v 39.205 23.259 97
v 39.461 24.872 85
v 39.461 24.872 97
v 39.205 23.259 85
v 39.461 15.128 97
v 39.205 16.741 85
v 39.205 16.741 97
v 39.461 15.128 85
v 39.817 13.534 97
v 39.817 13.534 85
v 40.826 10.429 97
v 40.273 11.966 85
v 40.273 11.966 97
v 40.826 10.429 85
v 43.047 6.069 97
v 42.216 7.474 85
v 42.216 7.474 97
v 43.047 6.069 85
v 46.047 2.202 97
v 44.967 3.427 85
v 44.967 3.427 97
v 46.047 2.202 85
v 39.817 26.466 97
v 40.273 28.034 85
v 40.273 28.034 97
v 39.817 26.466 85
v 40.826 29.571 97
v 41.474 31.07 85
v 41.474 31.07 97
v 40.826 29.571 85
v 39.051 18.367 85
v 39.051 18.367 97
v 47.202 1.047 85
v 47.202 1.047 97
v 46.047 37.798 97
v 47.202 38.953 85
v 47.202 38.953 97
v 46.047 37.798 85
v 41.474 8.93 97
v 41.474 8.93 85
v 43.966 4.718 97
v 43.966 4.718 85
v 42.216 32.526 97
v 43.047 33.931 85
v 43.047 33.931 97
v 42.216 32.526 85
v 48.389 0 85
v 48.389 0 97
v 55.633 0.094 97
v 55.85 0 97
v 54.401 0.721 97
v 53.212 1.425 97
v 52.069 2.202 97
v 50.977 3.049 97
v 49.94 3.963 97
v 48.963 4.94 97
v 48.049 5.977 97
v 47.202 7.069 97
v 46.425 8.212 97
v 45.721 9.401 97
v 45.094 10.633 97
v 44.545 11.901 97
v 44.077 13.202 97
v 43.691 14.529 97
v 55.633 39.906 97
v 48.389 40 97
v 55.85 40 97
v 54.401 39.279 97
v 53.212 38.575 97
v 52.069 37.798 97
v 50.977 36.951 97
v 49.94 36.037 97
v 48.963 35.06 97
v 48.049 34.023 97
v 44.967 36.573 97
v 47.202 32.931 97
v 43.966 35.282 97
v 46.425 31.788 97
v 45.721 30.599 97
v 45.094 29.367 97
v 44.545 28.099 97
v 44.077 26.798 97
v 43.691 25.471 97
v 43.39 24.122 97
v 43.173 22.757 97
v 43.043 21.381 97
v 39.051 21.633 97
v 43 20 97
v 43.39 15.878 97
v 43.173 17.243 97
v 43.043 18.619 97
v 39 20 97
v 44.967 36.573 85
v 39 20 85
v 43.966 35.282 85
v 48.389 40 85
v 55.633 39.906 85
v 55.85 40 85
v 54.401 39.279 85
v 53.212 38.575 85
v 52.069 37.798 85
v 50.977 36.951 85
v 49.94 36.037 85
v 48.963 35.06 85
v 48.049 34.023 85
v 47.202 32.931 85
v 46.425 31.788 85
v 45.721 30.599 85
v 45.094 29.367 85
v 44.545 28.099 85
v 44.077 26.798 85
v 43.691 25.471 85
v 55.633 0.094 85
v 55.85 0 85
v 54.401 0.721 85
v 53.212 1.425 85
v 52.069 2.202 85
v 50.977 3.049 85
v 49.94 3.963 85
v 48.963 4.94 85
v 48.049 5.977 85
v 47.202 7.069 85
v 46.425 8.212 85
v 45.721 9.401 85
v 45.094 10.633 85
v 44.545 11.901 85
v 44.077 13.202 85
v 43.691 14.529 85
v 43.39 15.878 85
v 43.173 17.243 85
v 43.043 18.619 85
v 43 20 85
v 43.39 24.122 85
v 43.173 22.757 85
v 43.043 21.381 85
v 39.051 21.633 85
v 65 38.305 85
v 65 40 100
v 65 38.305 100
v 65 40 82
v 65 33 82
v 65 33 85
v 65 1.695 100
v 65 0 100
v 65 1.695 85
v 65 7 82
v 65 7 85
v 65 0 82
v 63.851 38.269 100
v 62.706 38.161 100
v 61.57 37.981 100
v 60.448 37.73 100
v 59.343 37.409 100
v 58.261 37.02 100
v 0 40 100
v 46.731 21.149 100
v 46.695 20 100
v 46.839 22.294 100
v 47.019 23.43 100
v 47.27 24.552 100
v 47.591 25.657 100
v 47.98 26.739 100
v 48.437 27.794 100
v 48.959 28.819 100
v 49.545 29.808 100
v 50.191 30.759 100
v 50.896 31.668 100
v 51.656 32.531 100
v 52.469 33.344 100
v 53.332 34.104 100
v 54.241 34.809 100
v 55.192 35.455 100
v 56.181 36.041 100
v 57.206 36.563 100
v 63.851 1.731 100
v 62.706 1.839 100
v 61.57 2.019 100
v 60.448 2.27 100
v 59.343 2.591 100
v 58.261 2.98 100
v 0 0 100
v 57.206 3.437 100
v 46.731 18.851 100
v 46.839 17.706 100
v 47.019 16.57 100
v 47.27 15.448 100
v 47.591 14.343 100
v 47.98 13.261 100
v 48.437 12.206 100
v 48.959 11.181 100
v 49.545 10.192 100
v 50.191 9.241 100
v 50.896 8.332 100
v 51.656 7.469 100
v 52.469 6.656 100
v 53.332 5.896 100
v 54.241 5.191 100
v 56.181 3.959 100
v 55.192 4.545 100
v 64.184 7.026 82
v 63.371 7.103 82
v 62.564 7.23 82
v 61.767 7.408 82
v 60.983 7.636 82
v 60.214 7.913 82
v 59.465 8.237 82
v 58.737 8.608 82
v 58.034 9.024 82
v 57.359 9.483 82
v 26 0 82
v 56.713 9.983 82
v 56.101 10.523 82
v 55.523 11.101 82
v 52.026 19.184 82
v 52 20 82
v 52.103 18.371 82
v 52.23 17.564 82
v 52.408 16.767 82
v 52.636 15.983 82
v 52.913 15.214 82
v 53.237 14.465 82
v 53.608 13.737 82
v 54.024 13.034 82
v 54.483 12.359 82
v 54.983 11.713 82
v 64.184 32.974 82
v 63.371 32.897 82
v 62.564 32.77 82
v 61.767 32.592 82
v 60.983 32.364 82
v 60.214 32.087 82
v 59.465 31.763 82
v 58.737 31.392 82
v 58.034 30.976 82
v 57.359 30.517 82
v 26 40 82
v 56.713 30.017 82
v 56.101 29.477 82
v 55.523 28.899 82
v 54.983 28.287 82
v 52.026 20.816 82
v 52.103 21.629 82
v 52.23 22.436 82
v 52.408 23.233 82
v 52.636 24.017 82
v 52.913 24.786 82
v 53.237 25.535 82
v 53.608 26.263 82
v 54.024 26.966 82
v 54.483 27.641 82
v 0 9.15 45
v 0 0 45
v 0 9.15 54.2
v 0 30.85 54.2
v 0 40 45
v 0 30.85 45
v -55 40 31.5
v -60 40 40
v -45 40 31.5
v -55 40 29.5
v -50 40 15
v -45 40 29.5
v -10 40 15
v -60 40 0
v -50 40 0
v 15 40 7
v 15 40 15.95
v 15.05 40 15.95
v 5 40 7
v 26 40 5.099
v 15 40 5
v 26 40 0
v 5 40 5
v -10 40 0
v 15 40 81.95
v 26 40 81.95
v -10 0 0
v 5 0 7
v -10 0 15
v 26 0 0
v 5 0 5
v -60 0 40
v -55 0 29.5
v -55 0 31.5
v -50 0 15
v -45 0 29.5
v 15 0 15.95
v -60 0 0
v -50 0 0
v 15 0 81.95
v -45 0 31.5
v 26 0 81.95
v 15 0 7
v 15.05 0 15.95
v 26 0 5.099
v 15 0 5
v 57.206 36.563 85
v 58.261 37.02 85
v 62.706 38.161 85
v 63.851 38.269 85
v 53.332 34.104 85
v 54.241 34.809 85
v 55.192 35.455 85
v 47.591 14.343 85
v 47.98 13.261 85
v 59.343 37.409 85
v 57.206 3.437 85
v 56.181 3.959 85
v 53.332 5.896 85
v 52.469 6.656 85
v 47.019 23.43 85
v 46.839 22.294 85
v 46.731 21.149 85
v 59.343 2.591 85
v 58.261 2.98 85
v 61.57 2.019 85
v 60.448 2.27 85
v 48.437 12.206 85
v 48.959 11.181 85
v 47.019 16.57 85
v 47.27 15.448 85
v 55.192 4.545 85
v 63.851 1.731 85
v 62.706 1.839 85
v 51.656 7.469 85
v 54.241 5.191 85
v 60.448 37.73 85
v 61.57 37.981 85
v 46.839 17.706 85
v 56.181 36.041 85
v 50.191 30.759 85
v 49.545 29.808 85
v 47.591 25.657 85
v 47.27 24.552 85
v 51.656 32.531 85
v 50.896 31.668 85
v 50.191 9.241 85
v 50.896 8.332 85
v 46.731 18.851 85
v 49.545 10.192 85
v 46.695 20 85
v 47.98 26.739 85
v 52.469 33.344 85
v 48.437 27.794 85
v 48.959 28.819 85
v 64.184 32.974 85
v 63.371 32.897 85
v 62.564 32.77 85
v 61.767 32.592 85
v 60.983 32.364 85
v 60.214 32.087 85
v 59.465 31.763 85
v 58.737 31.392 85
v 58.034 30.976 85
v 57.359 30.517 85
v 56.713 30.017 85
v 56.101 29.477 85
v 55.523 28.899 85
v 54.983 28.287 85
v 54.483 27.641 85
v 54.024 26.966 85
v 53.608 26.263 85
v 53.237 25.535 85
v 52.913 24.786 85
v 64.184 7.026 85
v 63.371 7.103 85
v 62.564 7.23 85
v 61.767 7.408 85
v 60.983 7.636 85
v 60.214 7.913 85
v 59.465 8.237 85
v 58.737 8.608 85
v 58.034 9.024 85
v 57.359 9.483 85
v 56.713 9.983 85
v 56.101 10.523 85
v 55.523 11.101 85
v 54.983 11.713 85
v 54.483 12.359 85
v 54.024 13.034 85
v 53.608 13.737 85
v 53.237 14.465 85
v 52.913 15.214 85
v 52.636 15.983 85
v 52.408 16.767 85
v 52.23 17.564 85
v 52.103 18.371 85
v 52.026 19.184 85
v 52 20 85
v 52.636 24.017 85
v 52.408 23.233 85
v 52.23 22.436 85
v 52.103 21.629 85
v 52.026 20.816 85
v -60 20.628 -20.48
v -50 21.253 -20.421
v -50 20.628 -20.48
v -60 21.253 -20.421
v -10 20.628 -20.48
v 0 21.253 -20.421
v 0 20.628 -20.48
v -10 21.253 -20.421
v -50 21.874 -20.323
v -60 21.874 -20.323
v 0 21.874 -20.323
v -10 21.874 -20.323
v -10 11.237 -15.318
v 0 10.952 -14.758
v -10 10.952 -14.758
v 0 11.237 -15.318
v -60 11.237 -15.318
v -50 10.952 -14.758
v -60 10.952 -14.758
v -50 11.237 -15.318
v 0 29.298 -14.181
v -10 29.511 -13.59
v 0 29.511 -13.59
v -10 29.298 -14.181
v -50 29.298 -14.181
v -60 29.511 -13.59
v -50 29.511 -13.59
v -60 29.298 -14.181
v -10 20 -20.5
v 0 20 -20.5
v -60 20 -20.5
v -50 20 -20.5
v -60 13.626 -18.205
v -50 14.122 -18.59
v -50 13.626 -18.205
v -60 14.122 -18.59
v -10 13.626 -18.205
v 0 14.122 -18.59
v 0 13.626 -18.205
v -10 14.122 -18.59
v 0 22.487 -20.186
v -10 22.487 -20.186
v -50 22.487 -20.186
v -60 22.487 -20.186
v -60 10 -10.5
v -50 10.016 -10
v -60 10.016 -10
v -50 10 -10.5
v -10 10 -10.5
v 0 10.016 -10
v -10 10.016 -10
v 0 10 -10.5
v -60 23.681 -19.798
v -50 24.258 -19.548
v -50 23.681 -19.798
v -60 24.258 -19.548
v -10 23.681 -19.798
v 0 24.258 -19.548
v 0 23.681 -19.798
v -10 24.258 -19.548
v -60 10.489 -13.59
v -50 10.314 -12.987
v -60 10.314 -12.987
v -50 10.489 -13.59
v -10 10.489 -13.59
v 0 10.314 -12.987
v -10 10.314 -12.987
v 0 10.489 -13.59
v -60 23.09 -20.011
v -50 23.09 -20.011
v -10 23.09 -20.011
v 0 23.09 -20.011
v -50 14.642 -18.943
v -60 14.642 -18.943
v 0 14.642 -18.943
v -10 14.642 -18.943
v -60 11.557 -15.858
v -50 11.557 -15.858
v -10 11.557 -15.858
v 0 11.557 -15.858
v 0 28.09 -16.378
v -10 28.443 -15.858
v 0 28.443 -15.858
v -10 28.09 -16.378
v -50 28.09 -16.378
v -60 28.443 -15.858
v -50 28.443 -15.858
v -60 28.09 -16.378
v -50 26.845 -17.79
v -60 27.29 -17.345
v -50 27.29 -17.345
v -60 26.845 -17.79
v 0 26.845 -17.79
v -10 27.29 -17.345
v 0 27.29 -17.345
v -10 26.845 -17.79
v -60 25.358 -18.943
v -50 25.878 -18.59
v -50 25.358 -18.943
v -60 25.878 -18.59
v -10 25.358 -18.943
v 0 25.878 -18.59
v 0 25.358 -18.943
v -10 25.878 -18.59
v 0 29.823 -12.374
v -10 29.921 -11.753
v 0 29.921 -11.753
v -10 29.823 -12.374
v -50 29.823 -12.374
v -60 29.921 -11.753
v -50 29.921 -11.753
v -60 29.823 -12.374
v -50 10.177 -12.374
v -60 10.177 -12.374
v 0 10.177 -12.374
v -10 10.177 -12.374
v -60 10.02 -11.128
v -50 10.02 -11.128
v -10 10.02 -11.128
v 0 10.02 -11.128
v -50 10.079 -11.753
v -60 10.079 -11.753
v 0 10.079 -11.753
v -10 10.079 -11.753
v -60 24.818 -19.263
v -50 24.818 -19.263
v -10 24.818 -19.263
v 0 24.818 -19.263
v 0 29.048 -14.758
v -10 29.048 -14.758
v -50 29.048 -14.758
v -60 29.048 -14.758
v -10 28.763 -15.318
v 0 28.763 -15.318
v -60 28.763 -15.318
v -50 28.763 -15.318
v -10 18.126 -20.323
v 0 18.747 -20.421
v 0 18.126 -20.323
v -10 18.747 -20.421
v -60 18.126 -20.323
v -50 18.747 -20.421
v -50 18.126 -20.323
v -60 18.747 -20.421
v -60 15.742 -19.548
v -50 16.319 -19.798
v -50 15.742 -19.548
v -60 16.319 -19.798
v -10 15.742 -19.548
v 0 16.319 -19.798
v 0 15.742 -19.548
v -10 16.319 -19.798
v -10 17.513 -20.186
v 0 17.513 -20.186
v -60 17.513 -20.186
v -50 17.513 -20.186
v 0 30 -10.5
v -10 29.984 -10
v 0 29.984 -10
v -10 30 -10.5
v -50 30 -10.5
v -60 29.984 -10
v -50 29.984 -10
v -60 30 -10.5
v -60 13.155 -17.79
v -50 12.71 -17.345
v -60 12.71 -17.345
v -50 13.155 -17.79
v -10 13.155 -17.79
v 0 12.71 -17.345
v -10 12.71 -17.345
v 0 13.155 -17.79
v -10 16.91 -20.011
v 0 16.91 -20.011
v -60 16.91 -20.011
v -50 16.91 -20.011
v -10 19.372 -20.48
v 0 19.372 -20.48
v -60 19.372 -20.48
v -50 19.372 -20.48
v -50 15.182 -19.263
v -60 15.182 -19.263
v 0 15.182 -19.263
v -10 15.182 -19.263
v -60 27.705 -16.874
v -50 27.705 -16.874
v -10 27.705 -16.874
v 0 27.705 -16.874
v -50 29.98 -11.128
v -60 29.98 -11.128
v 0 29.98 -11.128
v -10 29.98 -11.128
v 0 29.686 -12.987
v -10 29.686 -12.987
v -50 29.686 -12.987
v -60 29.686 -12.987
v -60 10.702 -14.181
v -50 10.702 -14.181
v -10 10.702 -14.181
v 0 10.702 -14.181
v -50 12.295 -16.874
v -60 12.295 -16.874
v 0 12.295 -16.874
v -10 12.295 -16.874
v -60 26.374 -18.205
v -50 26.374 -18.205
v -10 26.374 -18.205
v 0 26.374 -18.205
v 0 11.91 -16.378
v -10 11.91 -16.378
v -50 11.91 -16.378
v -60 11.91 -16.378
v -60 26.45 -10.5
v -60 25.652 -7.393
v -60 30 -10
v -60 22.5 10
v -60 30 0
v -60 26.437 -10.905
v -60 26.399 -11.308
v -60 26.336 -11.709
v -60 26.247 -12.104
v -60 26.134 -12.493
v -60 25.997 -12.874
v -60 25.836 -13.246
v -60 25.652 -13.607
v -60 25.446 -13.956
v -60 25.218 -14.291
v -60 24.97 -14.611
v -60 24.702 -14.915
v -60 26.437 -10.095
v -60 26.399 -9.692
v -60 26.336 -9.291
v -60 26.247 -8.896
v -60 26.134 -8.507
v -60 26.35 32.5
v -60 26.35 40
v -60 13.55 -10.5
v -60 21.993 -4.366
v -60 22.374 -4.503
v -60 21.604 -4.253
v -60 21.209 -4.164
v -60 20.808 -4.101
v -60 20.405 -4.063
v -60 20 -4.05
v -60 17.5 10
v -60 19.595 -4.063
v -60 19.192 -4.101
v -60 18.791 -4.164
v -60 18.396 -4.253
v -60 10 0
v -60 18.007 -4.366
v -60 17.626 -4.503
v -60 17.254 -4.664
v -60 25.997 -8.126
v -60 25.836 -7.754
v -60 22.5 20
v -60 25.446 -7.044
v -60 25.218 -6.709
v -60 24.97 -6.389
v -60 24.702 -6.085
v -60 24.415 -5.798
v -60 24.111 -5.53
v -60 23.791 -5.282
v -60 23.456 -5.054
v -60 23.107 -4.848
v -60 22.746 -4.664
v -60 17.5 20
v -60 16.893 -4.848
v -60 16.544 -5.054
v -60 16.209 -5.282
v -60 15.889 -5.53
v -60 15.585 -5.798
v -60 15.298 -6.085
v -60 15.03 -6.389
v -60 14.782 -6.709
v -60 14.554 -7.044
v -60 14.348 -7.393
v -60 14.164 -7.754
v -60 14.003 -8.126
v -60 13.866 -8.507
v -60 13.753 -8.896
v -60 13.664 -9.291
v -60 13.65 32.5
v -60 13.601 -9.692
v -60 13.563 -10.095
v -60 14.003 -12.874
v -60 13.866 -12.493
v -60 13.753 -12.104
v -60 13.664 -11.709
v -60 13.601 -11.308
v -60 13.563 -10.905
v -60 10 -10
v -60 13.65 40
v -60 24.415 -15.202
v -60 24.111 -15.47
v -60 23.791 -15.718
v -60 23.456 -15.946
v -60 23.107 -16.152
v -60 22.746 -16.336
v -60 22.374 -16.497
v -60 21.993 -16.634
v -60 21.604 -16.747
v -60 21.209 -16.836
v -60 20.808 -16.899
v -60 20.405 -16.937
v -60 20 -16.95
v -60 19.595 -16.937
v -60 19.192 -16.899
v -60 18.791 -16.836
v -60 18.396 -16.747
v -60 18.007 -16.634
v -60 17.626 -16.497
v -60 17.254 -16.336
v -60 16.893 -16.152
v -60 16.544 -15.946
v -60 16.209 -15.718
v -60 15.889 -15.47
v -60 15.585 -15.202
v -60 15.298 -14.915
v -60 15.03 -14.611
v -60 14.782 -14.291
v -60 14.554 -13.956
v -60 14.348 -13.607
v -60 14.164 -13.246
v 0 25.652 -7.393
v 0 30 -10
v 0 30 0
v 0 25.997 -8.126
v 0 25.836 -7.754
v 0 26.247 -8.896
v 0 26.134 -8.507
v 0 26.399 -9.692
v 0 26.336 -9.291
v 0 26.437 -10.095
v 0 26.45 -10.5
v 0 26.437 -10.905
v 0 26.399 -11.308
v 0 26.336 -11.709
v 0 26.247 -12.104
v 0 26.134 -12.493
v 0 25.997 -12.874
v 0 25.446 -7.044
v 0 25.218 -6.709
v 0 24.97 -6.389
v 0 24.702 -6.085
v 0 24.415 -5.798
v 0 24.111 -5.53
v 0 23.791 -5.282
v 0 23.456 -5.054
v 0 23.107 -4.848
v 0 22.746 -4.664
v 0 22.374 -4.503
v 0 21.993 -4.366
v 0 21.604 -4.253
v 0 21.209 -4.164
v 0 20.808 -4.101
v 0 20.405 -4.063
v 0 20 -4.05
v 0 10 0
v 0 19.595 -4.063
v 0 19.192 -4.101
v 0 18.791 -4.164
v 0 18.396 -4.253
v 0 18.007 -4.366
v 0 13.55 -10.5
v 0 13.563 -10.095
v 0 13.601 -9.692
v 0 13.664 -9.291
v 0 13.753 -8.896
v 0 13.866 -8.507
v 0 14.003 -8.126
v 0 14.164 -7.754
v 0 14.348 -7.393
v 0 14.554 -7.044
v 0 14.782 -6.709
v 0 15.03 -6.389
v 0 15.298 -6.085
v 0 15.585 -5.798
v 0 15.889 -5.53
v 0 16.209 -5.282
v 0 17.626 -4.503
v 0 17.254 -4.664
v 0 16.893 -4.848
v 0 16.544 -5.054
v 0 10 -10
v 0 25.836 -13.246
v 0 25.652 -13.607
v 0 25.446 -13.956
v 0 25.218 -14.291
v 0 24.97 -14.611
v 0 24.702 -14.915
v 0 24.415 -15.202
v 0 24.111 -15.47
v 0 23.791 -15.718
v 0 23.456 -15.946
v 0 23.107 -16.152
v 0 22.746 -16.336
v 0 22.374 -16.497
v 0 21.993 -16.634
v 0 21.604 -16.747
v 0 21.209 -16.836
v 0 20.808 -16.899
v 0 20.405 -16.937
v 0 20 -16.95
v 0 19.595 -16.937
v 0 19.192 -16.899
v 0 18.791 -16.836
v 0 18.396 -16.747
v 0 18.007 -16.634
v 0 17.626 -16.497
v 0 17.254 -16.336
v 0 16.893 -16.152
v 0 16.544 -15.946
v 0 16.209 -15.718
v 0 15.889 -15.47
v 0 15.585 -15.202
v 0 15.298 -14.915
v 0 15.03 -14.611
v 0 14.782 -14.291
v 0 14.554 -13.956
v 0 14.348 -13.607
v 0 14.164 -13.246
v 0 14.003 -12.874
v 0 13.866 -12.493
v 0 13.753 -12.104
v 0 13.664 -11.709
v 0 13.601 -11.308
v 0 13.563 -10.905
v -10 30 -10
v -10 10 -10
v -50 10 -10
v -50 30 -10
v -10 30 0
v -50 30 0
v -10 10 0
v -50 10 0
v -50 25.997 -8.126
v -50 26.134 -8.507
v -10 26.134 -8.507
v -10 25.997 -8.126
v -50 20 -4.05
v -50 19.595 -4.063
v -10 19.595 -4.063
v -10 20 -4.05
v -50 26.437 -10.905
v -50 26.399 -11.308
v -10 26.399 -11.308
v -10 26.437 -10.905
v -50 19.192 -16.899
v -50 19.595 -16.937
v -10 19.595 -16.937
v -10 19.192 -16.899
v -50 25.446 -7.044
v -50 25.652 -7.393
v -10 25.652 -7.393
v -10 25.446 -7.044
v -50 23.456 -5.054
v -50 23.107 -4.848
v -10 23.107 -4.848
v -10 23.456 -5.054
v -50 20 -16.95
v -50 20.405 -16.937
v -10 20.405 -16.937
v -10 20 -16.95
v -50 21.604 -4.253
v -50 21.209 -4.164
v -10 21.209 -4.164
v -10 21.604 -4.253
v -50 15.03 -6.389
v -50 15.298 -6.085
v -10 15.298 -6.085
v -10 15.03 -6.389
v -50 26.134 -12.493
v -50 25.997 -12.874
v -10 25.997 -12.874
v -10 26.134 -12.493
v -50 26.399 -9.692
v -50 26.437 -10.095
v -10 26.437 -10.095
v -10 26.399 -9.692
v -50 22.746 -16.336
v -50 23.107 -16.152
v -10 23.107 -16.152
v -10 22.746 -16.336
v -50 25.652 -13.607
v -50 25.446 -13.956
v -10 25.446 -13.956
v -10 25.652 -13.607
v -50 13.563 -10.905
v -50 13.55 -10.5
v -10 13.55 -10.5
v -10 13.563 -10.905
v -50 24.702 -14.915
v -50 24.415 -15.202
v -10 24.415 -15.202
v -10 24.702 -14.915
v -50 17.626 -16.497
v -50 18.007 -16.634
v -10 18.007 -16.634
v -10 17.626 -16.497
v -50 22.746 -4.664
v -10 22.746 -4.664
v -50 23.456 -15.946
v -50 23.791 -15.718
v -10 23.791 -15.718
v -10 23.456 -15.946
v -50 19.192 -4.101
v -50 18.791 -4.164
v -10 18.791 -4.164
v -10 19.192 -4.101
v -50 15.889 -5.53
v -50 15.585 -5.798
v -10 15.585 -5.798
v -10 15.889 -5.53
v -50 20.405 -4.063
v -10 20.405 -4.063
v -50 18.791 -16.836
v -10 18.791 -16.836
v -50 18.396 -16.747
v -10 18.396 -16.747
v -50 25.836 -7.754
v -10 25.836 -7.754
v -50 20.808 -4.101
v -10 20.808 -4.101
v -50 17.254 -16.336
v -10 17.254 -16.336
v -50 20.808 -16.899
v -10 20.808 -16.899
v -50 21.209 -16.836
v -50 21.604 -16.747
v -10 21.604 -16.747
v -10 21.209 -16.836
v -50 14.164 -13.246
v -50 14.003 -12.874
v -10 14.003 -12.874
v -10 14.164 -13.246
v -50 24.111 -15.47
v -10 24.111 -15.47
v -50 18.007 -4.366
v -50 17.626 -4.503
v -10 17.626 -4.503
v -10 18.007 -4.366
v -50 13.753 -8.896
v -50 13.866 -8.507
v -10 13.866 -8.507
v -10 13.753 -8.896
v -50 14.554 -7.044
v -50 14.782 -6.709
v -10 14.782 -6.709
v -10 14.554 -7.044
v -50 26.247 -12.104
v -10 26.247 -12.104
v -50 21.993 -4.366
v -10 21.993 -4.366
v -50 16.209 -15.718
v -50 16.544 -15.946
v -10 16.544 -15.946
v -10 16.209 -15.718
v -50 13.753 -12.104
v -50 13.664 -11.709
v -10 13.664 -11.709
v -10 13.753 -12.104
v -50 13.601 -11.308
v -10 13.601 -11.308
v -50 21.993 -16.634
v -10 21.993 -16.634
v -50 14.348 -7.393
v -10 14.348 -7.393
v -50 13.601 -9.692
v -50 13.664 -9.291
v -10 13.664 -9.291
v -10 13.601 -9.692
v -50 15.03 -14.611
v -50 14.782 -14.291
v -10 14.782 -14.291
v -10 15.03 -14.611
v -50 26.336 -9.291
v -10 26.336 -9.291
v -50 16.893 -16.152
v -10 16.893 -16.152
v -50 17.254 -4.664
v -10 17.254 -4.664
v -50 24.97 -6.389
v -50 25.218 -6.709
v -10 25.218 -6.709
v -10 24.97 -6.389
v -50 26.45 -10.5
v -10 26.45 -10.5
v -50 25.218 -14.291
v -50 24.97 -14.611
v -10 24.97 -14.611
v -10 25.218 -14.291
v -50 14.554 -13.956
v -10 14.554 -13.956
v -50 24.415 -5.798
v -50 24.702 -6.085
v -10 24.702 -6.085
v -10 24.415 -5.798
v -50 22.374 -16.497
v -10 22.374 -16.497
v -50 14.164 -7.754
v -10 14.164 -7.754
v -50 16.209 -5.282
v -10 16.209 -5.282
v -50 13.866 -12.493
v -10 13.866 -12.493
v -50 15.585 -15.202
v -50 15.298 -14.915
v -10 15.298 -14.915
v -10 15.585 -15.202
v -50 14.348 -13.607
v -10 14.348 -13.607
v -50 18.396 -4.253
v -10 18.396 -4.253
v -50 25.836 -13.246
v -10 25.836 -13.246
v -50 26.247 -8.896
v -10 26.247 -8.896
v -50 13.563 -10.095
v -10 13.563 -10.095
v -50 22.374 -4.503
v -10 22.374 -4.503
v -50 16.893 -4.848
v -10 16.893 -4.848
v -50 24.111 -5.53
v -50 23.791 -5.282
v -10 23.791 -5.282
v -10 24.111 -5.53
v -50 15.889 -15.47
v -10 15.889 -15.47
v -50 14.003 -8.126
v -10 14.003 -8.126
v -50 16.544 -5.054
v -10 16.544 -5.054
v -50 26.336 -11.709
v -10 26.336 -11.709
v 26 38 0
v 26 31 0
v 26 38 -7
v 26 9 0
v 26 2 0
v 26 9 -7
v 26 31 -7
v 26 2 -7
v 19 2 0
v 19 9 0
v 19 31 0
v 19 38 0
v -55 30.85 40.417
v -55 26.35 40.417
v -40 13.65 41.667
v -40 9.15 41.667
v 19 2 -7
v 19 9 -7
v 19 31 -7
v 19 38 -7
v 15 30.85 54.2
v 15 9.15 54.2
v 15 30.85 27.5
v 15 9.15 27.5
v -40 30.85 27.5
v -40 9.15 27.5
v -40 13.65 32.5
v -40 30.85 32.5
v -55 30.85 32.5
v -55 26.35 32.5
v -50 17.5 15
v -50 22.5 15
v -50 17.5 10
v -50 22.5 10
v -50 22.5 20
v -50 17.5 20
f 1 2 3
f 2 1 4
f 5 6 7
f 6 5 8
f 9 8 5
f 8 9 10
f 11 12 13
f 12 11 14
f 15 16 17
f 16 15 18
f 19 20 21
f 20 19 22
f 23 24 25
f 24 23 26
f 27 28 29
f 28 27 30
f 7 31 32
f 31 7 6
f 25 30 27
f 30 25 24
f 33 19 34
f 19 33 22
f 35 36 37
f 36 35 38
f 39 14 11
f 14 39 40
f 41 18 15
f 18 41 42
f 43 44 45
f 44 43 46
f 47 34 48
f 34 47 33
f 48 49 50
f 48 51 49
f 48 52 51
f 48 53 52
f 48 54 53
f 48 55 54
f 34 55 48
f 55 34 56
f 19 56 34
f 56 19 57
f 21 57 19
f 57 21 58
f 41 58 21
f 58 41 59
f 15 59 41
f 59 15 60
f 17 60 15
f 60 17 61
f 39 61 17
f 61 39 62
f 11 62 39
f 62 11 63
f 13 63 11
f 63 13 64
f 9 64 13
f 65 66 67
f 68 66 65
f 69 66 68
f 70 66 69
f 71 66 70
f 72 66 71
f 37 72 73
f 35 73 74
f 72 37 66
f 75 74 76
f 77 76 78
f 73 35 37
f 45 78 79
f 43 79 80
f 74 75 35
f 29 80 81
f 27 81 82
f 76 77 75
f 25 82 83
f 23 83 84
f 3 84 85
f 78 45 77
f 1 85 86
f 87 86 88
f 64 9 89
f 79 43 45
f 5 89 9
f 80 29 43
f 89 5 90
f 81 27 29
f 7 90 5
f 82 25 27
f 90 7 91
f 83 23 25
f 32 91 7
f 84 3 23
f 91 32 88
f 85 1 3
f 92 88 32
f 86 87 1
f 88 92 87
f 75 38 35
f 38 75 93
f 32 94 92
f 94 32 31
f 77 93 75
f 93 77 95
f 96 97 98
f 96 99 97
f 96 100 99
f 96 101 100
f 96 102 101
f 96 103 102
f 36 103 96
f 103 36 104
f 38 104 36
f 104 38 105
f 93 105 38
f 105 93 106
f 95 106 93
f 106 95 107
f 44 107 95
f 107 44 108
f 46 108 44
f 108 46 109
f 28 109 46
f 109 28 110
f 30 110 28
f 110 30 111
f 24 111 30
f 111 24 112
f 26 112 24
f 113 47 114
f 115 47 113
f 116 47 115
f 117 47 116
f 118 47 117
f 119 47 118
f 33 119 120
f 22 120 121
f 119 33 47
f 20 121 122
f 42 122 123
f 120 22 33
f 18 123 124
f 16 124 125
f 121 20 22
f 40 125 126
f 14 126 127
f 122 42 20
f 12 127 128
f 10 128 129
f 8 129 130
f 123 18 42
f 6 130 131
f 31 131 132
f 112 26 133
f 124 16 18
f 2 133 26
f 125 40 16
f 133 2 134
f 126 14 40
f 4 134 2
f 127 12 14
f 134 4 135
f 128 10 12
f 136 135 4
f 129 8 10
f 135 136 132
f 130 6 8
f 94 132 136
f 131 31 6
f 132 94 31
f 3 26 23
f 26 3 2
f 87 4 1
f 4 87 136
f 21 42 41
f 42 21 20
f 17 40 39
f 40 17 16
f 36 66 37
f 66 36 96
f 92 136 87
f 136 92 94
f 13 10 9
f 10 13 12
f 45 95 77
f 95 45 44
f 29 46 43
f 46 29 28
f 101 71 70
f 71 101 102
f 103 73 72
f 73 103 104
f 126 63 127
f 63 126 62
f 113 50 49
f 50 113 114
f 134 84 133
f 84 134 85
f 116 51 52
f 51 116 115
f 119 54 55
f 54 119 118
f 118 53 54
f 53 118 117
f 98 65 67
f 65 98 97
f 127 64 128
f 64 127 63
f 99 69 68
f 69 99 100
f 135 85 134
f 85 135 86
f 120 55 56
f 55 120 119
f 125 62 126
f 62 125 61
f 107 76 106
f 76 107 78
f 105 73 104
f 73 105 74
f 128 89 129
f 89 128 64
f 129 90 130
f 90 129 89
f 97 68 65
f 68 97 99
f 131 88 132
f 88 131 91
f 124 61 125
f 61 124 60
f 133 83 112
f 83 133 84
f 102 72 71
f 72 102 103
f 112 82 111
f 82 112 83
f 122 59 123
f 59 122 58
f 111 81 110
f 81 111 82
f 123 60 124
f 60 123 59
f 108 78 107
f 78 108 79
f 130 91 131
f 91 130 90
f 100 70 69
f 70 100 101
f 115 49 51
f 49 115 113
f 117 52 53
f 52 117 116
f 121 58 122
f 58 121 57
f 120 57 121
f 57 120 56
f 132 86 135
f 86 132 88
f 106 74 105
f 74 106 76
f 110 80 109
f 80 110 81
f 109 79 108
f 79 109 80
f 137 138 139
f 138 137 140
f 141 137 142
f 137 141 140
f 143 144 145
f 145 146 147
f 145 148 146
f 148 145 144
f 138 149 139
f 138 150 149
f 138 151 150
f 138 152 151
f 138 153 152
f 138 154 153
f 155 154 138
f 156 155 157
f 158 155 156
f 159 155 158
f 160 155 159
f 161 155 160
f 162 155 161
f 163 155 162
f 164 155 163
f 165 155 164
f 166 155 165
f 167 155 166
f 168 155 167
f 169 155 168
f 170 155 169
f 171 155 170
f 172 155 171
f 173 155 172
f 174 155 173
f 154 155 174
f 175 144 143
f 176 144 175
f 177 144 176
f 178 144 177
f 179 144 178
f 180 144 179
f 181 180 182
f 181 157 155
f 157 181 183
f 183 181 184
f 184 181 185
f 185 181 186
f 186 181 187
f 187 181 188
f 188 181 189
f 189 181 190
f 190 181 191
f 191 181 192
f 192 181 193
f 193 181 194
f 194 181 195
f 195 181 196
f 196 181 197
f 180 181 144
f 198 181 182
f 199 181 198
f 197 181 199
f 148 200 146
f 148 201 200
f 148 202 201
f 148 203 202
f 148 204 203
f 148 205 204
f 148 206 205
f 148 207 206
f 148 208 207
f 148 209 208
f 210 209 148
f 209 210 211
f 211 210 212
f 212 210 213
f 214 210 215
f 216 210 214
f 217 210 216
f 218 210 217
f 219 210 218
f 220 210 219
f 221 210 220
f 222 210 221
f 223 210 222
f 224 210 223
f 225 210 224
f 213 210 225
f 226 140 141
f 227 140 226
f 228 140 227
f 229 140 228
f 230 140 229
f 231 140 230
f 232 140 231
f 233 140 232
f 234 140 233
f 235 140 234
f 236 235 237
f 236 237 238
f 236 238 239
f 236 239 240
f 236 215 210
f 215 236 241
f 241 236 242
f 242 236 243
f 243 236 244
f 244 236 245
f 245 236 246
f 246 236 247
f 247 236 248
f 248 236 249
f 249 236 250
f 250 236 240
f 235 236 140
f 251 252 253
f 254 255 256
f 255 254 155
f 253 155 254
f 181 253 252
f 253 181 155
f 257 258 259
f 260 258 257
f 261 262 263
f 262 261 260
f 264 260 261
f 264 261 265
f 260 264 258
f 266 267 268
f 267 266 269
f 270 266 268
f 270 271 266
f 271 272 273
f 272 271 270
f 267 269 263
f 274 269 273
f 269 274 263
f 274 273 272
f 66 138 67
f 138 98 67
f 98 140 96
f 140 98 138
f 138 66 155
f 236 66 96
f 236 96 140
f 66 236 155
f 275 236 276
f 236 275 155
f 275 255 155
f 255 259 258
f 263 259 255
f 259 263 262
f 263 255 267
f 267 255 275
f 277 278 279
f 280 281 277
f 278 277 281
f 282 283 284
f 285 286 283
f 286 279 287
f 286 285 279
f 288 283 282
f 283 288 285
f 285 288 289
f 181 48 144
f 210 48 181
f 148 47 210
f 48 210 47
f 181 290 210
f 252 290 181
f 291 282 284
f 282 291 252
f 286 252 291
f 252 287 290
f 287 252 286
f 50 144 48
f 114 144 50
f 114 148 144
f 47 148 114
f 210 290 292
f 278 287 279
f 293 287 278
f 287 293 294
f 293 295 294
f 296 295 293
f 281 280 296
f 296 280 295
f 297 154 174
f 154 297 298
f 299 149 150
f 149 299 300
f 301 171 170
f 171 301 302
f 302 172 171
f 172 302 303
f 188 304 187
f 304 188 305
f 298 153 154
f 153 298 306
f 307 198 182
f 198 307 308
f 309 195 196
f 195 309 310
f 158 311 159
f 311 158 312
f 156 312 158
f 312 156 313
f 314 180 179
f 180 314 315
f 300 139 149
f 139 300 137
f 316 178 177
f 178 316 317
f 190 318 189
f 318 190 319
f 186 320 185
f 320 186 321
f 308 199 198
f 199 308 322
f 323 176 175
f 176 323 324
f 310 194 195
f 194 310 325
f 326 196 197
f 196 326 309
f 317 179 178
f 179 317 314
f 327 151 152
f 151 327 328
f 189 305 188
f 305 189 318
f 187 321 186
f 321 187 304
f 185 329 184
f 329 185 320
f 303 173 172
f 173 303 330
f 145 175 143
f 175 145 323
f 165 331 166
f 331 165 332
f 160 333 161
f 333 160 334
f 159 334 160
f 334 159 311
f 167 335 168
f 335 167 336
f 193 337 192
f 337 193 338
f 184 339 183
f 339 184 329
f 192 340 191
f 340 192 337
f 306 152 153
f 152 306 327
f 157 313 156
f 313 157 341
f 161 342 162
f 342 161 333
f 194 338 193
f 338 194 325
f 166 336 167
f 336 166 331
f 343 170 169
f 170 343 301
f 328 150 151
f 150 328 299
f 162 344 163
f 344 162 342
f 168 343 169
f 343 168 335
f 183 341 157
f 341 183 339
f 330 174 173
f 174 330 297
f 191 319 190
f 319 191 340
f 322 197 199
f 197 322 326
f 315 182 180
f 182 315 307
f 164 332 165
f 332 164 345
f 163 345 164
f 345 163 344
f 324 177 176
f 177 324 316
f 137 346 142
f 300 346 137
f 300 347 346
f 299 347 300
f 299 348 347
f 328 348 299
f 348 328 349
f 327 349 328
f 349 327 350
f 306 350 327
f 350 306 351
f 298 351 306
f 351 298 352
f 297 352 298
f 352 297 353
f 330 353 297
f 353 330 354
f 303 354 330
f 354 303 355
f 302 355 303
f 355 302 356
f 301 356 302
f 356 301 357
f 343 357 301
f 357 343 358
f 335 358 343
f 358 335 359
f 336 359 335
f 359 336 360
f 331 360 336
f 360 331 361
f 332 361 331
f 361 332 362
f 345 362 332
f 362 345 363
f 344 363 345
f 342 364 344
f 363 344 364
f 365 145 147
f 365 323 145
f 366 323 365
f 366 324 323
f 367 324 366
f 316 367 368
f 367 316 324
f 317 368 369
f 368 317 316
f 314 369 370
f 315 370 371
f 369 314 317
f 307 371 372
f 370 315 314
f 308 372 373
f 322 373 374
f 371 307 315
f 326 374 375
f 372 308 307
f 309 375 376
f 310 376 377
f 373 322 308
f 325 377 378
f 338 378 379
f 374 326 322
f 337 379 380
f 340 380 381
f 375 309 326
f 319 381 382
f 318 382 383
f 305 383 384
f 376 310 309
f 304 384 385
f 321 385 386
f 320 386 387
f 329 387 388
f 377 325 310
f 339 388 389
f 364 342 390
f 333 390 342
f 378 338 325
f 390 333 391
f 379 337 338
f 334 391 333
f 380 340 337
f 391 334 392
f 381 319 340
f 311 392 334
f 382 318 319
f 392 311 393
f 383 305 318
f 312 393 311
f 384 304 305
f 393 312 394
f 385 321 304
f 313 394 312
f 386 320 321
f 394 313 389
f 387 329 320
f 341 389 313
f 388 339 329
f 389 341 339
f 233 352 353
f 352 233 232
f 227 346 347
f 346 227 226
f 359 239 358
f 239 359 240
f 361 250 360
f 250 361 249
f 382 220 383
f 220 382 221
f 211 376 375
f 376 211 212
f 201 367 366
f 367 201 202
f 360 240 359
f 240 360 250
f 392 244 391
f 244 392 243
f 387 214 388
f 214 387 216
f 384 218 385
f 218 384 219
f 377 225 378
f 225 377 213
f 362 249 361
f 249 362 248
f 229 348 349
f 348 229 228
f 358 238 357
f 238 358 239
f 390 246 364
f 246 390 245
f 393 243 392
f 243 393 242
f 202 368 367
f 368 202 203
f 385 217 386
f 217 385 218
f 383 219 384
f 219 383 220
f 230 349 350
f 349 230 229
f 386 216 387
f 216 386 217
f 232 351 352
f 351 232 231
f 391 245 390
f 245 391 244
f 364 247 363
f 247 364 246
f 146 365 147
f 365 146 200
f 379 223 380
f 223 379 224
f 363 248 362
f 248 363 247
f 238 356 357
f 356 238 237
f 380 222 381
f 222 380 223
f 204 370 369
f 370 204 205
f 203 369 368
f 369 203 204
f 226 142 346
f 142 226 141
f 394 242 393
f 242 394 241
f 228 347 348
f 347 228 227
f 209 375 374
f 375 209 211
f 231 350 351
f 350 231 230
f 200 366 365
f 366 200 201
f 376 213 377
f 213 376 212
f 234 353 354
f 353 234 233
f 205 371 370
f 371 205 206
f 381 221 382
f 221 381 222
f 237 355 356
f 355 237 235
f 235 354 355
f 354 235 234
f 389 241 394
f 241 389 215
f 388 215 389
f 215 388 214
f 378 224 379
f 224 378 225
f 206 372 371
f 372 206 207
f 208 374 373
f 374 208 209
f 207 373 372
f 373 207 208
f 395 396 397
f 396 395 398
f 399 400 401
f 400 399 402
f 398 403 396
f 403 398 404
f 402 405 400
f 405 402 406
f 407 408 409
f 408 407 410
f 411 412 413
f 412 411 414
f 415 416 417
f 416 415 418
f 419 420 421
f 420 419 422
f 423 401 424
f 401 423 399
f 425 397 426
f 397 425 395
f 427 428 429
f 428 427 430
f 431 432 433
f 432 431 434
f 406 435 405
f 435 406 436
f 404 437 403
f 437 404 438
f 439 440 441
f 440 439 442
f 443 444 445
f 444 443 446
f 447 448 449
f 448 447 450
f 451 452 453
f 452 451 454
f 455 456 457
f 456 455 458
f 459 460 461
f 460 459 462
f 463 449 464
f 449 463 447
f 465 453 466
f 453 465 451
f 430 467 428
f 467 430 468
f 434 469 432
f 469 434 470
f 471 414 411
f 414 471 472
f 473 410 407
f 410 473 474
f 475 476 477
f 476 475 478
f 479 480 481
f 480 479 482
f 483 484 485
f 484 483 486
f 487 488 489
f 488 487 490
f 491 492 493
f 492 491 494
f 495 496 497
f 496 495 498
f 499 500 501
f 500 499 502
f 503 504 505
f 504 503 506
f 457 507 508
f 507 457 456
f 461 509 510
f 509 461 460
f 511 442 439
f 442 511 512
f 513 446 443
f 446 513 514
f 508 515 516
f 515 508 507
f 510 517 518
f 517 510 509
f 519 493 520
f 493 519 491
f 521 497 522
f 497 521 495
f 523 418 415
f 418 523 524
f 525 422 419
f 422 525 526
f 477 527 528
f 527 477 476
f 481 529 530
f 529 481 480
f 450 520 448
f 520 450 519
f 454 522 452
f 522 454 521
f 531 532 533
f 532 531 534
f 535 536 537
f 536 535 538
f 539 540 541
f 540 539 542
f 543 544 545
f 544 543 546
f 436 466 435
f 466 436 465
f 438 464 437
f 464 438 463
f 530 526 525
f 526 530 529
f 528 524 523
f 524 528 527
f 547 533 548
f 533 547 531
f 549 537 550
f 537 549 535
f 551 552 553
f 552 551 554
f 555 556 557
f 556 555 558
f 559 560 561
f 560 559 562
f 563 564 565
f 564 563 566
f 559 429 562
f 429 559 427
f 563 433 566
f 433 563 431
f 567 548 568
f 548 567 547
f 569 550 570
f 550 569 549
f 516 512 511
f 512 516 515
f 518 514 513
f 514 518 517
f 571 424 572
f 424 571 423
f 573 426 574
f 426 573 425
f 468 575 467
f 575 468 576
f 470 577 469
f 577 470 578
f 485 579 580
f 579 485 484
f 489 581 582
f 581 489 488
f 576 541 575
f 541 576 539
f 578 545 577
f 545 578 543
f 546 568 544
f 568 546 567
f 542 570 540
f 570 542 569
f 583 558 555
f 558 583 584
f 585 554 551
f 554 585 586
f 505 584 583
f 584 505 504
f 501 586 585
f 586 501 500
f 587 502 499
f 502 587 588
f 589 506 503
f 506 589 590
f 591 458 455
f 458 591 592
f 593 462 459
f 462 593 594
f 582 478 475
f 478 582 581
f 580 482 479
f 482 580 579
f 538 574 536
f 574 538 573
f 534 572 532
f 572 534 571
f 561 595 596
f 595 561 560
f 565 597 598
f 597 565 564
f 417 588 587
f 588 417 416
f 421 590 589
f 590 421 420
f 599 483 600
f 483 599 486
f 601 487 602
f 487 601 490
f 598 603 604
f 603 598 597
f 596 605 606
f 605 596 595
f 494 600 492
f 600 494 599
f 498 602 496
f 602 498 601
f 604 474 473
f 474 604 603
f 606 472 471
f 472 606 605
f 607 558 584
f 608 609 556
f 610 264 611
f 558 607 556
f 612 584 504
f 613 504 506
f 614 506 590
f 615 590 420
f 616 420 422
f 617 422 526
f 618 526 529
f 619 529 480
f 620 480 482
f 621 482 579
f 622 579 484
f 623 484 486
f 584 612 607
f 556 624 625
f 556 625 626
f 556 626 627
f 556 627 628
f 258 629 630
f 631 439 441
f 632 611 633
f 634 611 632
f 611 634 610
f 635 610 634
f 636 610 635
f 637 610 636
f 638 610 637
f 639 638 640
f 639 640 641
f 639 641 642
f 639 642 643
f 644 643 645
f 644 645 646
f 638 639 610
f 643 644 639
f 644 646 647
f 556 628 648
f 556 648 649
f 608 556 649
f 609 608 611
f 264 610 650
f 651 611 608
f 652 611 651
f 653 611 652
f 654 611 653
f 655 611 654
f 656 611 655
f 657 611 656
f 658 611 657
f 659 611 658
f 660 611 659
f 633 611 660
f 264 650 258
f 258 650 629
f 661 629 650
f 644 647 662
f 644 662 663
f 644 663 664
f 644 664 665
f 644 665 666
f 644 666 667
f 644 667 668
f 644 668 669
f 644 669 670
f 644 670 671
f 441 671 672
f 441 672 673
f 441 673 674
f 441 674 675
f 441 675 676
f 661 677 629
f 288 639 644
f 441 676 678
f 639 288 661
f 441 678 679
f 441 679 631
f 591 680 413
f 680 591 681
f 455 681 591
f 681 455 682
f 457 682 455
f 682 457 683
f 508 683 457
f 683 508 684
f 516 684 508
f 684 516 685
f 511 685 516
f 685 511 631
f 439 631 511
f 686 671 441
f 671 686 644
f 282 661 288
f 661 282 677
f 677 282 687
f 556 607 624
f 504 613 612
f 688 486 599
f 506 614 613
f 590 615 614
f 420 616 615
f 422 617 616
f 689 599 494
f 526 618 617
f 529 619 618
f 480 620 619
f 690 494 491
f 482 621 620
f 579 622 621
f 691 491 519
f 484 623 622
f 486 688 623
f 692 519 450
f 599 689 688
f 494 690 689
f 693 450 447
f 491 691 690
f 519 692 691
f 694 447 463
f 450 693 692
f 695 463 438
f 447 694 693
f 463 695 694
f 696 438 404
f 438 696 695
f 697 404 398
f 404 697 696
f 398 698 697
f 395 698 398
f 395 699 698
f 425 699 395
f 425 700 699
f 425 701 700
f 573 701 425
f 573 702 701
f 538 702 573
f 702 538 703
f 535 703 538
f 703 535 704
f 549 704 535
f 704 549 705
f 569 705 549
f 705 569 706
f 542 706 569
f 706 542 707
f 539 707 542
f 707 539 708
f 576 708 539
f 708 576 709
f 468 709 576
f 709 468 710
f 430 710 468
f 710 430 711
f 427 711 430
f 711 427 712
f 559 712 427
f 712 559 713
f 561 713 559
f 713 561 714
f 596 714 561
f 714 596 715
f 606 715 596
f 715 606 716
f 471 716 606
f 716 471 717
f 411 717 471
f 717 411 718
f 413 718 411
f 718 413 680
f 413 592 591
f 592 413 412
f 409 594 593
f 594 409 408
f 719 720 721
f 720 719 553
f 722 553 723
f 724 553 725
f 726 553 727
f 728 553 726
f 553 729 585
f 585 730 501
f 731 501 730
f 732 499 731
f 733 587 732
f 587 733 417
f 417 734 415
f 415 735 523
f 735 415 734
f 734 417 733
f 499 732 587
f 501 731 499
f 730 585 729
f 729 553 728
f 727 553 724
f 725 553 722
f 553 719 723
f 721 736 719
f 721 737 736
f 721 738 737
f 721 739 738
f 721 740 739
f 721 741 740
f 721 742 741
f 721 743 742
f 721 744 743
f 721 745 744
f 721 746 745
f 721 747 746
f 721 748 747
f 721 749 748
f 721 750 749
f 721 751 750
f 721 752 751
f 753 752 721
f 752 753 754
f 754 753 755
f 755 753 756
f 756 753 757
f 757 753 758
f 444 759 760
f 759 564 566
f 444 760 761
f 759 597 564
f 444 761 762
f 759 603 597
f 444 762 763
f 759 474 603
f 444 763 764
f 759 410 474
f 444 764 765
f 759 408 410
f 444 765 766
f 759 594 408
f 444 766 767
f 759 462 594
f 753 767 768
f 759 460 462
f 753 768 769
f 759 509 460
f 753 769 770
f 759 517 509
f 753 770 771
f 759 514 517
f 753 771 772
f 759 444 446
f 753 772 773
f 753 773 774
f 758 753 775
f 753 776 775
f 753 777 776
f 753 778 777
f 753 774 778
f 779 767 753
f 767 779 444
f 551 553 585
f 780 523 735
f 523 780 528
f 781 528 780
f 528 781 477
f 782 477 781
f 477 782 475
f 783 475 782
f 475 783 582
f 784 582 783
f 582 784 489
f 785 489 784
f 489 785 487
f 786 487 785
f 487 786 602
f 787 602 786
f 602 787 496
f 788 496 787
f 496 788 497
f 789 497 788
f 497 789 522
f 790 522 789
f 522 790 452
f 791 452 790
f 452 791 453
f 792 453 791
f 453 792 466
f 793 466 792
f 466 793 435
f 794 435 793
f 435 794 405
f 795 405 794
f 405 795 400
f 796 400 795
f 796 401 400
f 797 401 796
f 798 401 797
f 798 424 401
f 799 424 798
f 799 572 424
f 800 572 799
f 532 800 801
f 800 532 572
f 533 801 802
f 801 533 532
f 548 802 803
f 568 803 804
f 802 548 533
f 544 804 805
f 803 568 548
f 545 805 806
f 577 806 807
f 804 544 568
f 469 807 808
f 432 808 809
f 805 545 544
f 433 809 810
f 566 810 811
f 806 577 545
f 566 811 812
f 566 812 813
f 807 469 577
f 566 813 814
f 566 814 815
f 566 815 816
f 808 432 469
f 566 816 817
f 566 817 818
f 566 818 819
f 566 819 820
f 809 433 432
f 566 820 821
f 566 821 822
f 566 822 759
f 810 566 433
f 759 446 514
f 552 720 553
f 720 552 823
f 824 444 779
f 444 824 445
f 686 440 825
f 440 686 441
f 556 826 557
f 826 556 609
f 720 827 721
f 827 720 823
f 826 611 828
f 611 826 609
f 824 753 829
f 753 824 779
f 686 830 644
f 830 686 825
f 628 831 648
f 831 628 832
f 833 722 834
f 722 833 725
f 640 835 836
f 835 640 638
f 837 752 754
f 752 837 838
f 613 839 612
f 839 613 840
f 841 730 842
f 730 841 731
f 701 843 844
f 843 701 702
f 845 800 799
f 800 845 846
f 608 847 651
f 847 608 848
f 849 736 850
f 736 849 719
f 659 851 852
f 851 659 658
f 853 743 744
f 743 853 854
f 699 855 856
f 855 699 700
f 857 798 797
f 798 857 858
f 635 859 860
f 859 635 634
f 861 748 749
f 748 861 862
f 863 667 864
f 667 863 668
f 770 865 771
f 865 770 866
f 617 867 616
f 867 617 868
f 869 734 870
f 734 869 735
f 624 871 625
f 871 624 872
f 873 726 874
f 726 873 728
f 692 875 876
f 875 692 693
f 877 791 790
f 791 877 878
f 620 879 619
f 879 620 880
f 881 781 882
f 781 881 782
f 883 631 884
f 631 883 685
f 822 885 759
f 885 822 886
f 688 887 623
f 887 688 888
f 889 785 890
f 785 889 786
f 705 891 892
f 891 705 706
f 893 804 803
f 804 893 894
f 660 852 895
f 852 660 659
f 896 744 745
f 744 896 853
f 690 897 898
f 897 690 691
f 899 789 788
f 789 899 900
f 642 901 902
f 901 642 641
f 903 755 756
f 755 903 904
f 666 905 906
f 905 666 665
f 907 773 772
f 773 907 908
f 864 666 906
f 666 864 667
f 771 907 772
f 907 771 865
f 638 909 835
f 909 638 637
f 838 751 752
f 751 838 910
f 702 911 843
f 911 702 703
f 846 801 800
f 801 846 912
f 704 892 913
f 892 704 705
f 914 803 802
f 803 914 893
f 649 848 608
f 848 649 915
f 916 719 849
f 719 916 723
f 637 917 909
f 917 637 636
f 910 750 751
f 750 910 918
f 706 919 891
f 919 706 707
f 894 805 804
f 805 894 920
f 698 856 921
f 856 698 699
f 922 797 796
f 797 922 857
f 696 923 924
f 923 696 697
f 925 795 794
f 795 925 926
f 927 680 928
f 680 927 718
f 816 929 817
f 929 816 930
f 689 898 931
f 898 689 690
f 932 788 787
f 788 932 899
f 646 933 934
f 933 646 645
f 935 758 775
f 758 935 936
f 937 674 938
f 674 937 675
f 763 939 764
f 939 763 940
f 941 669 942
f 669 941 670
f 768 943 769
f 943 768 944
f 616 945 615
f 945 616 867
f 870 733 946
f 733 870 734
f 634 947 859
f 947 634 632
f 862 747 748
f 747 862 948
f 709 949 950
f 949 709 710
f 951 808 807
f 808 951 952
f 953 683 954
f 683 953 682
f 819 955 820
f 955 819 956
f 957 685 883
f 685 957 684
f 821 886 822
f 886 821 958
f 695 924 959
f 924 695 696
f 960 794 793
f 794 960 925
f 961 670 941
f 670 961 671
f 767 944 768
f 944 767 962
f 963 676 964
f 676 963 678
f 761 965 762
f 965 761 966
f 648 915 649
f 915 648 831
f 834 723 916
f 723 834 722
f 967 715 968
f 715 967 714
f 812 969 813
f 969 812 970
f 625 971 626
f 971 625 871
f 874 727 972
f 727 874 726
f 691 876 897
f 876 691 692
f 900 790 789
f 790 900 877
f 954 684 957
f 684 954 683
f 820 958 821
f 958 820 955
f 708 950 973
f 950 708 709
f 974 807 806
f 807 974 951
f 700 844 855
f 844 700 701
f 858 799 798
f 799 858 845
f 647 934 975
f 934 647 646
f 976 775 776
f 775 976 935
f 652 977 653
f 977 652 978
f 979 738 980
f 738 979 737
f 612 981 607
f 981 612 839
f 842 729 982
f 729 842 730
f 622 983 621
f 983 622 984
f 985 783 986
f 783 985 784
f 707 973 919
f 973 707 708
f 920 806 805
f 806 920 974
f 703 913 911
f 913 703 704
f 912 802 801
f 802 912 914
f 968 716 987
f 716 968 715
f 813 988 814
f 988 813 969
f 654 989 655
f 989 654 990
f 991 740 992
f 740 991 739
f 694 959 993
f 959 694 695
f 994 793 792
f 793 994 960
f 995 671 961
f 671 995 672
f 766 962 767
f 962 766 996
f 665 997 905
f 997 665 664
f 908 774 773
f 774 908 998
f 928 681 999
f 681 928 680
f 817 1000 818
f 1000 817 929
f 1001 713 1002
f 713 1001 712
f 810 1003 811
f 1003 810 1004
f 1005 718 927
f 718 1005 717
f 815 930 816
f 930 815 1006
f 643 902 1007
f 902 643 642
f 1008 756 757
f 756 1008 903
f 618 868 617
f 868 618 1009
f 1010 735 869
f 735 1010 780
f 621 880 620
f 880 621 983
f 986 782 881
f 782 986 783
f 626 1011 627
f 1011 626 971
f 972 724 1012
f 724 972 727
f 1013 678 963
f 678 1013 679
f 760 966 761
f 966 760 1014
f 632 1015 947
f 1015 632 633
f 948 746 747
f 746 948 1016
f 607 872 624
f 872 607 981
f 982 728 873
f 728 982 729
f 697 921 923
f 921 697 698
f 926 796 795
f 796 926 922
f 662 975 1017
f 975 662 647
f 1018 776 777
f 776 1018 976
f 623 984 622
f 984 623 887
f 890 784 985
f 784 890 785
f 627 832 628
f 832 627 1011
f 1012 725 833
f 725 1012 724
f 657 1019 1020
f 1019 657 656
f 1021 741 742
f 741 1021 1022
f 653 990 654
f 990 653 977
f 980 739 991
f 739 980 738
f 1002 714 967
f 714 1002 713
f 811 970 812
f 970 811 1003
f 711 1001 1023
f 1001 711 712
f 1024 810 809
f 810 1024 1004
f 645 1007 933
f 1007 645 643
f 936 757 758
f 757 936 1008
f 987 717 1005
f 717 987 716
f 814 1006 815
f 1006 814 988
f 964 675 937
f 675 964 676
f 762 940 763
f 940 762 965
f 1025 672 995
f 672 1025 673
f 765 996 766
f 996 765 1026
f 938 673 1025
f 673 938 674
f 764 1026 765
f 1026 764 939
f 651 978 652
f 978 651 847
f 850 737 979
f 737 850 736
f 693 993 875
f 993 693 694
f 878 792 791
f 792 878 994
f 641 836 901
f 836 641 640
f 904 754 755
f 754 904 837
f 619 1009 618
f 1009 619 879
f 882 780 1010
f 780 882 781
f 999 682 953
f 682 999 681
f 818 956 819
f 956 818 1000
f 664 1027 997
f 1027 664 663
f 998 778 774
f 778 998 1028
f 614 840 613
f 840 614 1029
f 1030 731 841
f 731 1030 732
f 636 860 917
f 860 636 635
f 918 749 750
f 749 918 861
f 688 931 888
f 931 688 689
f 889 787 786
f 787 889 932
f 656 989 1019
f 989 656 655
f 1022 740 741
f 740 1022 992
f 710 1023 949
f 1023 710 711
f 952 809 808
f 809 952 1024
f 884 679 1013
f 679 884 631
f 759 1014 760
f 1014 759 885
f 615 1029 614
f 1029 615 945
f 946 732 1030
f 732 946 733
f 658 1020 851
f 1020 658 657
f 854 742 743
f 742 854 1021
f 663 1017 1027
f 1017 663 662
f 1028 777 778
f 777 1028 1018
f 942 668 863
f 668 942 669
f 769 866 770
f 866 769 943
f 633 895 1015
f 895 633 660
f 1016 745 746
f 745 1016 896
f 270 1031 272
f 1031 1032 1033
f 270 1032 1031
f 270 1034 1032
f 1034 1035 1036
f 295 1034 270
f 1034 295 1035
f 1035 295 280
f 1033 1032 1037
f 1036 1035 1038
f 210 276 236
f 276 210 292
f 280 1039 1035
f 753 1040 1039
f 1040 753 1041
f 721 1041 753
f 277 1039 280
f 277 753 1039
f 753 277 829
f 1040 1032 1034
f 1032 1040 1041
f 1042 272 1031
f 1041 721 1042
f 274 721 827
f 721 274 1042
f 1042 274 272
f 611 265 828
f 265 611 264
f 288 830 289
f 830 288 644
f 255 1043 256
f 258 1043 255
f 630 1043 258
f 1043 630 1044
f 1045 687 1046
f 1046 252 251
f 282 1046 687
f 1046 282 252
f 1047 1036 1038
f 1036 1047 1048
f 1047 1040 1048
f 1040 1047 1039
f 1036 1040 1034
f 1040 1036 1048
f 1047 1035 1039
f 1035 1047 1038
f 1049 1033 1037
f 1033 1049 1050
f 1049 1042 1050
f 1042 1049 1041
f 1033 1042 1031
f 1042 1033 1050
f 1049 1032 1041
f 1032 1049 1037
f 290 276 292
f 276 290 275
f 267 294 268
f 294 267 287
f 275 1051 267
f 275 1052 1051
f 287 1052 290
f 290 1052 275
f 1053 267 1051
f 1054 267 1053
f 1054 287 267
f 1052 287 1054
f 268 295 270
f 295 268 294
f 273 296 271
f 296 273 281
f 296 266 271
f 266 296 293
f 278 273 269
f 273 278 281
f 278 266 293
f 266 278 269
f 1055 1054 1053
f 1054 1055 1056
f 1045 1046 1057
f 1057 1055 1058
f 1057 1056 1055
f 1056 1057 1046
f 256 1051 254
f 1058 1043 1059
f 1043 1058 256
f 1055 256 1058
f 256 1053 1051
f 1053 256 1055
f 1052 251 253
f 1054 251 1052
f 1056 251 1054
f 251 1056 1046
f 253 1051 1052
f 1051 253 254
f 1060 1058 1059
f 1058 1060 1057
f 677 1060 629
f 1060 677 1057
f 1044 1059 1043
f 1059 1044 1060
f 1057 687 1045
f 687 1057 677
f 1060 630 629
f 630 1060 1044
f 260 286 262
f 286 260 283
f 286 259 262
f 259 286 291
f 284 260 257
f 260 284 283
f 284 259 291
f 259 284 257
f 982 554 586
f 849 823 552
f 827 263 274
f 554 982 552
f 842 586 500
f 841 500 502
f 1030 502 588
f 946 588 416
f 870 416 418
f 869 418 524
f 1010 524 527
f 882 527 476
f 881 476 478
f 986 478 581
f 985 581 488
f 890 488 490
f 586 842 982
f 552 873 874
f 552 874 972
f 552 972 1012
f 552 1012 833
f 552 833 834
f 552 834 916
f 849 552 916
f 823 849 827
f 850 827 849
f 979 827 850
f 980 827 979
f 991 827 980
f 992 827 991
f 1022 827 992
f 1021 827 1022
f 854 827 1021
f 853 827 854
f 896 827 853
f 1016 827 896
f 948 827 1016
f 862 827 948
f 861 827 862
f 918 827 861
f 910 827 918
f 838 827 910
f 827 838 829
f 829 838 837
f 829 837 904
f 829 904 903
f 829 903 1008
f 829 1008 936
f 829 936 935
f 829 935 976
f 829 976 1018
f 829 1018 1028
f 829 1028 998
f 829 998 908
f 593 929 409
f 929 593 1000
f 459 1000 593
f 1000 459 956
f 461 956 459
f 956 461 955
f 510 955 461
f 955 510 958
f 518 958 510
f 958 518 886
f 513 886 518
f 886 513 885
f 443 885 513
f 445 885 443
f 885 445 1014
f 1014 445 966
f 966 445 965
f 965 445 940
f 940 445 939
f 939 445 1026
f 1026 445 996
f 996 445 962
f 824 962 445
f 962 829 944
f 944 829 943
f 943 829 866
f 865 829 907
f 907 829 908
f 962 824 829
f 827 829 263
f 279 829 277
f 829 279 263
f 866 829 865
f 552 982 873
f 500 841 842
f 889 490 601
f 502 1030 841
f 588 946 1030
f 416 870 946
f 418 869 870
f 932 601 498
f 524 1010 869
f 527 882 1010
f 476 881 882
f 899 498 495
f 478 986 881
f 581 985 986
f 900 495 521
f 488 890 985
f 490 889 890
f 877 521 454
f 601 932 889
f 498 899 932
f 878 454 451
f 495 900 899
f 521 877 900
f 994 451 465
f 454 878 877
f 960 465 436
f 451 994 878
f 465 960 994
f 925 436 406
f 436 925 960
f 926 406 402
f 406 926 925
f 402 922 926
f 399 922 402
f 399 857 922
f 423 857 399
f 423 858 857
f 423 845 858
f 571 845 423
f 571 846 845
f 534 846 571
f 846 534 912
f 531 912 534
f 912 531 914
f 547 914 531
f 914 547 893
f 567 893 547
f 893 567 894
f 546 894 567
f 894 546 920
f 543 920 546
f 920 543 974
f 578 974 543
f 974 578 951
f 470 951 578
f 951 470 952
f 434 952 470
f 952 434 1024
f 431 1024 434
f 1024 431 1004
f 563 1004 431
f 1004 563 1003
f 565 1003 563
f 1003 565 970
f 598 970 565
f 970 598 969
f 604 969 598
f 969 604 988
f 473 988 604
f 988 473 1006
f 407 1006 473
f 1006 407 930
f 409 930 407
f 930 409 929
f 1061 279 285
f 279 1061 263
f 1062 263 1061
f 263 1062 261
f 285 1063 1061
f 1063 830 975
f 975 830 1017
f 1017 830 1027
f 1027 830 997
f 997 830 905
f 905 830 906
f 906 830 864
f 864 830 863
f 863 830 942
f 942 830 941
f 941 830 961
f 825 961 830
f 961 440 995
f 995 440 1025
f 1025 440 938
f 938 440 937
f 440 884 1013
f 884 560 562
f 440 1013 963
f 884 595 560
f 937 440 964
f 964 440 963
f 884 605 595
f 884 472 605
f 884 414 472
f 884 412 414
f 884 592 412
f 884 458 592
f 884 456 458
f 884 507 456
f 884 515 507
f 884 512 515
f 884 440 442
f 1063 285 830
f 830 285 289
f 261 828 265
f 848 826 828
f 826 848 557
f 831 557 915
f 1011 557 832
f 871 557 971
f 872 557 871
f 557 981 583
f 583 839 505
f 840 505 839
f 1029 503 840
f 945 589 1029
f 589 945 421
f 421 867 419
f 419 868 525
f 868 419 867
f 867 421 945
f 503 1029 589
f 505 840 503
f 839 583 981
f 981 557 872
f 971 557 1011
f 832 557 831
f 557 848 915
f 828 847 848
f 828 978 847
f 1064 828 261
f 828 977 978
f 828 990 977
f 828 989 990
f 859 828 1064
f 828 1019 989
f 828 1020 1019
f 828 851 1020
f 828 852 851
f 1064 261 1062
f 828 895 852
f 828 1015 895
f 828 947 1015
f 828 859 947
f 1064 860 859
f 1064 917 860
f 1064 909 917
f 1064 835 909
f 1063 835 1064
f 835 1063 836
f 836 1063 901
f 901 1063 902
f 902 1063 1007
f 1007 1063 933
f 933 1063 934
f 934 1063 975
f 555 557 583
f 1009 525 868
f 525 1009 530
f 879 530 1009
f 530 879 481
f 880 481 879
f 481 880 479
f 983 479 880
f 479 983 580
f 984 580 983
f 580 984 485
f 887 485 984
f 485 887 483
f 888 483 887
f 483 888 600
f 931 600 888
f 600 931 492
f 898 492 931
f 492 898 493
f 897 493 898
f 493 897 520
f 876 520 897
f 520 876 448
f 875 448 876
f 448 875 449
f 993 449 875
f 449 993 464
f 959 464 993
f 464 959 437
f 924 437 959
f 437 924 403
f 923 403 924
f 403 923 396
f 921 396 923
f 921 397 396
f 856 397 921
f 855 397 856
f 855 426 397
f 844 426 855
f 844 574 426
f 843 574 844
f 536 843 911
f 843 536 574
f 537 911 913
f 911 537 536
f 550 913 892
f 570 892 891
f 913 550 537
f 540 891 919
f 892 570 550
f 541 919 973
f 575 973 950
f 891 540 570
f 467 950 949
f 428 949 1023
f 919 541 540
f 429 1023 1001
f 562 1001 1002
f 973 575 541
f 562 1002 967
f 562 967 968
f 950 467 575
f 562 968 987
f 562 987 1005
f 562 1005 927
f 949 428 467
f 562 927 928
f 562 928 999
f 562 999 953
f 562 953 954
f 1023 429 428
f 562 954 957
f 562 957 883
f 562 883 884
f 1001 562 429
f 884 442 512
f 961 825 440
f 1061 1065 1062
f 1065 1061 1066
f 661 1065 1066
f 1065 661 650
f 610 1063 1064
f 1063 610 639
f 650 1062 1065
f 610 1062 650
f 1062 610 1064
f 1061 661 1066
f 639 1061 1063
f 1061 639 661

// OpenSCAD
radius_clamp = 6.45;
radius_clamp_outer = 10;
width_loadcell = 12.7;
height_loadcell = 12.7;
length_loadcell = 80;
height_bearing = 32.5;
width_stand = 40;
length_stand_front_base = 26;
length_stand_front_main = 15;
overhang_loadcell = 5;
length_stand_rear = length_stand_front_main  - length_loadcell + overhang_loadcell;
height_stand = 100;
height_arm = 18;
length_arm = 65;
gap_loadcell = 9;
fit_loadcell = 5;

motor_radius = 18.305;

$fn = 100;

difference() {
  union() {
    cube([26, 40, height_stand]);
    translate([0, width_stand, 0]) rotate([90,0,0]) linear_extrude(width_stand) polygon(points=[ [0,0], [length_stand_rear,0], [length_stand_rear,40], [0, 45] ]);
    translate([length_stand_front_base-7, 2, -7]) cube([7, 7, 7]);
    translate([length_stand_front_base-7, width_stand - 7 - 2, -7]) cube([7, 7, 7]);
    
    // motor holder
    difference() {
      translate([0, 0, height_stand-height_arm]) cube([length_arm, width_stand, height_arm]);
      translate([length_arm, 20, height_stand-(height_arm-3)]) cylinder(r=motor_radius, h=height_arm);

      // motor shaft hole
      translate([length_arm, 20, height_stand-(height_arm-3)-10]) cylinder(r=13, h=height_arm);

      // jubilee clip passage
      difference() {
        translate([length_arm, 20, height_stand-(height_arm-3)]) cylinder(r=26, h=height_arm-6);
        translate([length_arm, 20, height_stand-(height_arm-3)]) cylinder(r=22, h=height_arm-6);
      }
    }

    // clamp bar mount point
    difference() {
      union() {
        translate([length_stand_rear, (width_stand/2), -radius_clamp_outer-0.5]) rotate([0, 90, 0]) cylinder(h=-length_stand_rear, r=radius_clamp_outer);
        translate([length_stand_rear, (width_stand/2) - radius_clamp_outer, -10]) cube([-length_stand_rear, radius_clamp_outer*2, radius_clamp_outer+2]);
      }
      translate([length_stand_rear-1, (width_stand/2), -radius_clamp_outer-0.5]) rotate([0, 90, 0]) cylinder(h=2-length_stand_rear, r=radius_clamp);
    }
  }

  // cut out the front section
  translate([15, -1, 15.95]) cube([15+1, width_stand+2, 84-height_arm]);
  translate([0, width_stand+1, 0]) rotate([90,0,0]) linear_extrude(width_stand+2) polygon(points=[[15,16], [26.1,5], [26.1,16]]);
  // front jubilee passage
  translate([0, width_stand+1, 0]) rotate([90,0,0]) linear_extrude(width_stand+2) polygon(points=[ [5, 5], [5,7], [15,7], [15,5] ]);

  // gap for loadcell, plus space to move
  translate([length_stand_rear+20, (width_stand - (width_loadcell + gap_loadcell))/2, height_bearing - 5]) cube([200, width_loadcell+gap_loadcell, height_loadcell+gap_loadcell]);
  translate([length_stand_rear+20, (width_stand - (width_loadcell + gap_loadcell))/2, height_bearing]) cube([200, width_loadcell+gap_loadcell, height_loadcell+gap_loadcell]);
  translate([length_stand_rear+fit_loadcell, (width_stand - width_loadcell)/2, height_bearing]) cube([200, width_loadcell+gap_loadcell/2, height_loadcell+gap_loadcell]);

  // fit for load cell
  translate([length_stand_rear-1, (width_stand - width_loadcell)/2, height_bearing]) cube([200, width_loadcell, height_loadcell]);
  // loadcell jubilee passage
  translate([length_stand_rear, width_stand+1, height_bearing - 8]) rotate([90,0,0]) linear_extrude(width_stand+2) polygon(points=[ [5, 5], [5,7], [15,7], [15,5] ]);

  // Bite a chunk out to reduce printing time
  translate([length_stand_rear + 10, -1, -25]) cube([-length_stand_rear - 20, width_stand+2, 40]);

  // Take out a chunk so the pcb mount can join
  translate([length_stand_rear-1, (width_stand-5)/2, 10]) cube([11, 5, 10]);
}



//translate([length_stand_rear, (width_stand - width_loadcell)/2, height_bearing]) cube([length_loadcell, width_loadcell, height_loadcell]);
